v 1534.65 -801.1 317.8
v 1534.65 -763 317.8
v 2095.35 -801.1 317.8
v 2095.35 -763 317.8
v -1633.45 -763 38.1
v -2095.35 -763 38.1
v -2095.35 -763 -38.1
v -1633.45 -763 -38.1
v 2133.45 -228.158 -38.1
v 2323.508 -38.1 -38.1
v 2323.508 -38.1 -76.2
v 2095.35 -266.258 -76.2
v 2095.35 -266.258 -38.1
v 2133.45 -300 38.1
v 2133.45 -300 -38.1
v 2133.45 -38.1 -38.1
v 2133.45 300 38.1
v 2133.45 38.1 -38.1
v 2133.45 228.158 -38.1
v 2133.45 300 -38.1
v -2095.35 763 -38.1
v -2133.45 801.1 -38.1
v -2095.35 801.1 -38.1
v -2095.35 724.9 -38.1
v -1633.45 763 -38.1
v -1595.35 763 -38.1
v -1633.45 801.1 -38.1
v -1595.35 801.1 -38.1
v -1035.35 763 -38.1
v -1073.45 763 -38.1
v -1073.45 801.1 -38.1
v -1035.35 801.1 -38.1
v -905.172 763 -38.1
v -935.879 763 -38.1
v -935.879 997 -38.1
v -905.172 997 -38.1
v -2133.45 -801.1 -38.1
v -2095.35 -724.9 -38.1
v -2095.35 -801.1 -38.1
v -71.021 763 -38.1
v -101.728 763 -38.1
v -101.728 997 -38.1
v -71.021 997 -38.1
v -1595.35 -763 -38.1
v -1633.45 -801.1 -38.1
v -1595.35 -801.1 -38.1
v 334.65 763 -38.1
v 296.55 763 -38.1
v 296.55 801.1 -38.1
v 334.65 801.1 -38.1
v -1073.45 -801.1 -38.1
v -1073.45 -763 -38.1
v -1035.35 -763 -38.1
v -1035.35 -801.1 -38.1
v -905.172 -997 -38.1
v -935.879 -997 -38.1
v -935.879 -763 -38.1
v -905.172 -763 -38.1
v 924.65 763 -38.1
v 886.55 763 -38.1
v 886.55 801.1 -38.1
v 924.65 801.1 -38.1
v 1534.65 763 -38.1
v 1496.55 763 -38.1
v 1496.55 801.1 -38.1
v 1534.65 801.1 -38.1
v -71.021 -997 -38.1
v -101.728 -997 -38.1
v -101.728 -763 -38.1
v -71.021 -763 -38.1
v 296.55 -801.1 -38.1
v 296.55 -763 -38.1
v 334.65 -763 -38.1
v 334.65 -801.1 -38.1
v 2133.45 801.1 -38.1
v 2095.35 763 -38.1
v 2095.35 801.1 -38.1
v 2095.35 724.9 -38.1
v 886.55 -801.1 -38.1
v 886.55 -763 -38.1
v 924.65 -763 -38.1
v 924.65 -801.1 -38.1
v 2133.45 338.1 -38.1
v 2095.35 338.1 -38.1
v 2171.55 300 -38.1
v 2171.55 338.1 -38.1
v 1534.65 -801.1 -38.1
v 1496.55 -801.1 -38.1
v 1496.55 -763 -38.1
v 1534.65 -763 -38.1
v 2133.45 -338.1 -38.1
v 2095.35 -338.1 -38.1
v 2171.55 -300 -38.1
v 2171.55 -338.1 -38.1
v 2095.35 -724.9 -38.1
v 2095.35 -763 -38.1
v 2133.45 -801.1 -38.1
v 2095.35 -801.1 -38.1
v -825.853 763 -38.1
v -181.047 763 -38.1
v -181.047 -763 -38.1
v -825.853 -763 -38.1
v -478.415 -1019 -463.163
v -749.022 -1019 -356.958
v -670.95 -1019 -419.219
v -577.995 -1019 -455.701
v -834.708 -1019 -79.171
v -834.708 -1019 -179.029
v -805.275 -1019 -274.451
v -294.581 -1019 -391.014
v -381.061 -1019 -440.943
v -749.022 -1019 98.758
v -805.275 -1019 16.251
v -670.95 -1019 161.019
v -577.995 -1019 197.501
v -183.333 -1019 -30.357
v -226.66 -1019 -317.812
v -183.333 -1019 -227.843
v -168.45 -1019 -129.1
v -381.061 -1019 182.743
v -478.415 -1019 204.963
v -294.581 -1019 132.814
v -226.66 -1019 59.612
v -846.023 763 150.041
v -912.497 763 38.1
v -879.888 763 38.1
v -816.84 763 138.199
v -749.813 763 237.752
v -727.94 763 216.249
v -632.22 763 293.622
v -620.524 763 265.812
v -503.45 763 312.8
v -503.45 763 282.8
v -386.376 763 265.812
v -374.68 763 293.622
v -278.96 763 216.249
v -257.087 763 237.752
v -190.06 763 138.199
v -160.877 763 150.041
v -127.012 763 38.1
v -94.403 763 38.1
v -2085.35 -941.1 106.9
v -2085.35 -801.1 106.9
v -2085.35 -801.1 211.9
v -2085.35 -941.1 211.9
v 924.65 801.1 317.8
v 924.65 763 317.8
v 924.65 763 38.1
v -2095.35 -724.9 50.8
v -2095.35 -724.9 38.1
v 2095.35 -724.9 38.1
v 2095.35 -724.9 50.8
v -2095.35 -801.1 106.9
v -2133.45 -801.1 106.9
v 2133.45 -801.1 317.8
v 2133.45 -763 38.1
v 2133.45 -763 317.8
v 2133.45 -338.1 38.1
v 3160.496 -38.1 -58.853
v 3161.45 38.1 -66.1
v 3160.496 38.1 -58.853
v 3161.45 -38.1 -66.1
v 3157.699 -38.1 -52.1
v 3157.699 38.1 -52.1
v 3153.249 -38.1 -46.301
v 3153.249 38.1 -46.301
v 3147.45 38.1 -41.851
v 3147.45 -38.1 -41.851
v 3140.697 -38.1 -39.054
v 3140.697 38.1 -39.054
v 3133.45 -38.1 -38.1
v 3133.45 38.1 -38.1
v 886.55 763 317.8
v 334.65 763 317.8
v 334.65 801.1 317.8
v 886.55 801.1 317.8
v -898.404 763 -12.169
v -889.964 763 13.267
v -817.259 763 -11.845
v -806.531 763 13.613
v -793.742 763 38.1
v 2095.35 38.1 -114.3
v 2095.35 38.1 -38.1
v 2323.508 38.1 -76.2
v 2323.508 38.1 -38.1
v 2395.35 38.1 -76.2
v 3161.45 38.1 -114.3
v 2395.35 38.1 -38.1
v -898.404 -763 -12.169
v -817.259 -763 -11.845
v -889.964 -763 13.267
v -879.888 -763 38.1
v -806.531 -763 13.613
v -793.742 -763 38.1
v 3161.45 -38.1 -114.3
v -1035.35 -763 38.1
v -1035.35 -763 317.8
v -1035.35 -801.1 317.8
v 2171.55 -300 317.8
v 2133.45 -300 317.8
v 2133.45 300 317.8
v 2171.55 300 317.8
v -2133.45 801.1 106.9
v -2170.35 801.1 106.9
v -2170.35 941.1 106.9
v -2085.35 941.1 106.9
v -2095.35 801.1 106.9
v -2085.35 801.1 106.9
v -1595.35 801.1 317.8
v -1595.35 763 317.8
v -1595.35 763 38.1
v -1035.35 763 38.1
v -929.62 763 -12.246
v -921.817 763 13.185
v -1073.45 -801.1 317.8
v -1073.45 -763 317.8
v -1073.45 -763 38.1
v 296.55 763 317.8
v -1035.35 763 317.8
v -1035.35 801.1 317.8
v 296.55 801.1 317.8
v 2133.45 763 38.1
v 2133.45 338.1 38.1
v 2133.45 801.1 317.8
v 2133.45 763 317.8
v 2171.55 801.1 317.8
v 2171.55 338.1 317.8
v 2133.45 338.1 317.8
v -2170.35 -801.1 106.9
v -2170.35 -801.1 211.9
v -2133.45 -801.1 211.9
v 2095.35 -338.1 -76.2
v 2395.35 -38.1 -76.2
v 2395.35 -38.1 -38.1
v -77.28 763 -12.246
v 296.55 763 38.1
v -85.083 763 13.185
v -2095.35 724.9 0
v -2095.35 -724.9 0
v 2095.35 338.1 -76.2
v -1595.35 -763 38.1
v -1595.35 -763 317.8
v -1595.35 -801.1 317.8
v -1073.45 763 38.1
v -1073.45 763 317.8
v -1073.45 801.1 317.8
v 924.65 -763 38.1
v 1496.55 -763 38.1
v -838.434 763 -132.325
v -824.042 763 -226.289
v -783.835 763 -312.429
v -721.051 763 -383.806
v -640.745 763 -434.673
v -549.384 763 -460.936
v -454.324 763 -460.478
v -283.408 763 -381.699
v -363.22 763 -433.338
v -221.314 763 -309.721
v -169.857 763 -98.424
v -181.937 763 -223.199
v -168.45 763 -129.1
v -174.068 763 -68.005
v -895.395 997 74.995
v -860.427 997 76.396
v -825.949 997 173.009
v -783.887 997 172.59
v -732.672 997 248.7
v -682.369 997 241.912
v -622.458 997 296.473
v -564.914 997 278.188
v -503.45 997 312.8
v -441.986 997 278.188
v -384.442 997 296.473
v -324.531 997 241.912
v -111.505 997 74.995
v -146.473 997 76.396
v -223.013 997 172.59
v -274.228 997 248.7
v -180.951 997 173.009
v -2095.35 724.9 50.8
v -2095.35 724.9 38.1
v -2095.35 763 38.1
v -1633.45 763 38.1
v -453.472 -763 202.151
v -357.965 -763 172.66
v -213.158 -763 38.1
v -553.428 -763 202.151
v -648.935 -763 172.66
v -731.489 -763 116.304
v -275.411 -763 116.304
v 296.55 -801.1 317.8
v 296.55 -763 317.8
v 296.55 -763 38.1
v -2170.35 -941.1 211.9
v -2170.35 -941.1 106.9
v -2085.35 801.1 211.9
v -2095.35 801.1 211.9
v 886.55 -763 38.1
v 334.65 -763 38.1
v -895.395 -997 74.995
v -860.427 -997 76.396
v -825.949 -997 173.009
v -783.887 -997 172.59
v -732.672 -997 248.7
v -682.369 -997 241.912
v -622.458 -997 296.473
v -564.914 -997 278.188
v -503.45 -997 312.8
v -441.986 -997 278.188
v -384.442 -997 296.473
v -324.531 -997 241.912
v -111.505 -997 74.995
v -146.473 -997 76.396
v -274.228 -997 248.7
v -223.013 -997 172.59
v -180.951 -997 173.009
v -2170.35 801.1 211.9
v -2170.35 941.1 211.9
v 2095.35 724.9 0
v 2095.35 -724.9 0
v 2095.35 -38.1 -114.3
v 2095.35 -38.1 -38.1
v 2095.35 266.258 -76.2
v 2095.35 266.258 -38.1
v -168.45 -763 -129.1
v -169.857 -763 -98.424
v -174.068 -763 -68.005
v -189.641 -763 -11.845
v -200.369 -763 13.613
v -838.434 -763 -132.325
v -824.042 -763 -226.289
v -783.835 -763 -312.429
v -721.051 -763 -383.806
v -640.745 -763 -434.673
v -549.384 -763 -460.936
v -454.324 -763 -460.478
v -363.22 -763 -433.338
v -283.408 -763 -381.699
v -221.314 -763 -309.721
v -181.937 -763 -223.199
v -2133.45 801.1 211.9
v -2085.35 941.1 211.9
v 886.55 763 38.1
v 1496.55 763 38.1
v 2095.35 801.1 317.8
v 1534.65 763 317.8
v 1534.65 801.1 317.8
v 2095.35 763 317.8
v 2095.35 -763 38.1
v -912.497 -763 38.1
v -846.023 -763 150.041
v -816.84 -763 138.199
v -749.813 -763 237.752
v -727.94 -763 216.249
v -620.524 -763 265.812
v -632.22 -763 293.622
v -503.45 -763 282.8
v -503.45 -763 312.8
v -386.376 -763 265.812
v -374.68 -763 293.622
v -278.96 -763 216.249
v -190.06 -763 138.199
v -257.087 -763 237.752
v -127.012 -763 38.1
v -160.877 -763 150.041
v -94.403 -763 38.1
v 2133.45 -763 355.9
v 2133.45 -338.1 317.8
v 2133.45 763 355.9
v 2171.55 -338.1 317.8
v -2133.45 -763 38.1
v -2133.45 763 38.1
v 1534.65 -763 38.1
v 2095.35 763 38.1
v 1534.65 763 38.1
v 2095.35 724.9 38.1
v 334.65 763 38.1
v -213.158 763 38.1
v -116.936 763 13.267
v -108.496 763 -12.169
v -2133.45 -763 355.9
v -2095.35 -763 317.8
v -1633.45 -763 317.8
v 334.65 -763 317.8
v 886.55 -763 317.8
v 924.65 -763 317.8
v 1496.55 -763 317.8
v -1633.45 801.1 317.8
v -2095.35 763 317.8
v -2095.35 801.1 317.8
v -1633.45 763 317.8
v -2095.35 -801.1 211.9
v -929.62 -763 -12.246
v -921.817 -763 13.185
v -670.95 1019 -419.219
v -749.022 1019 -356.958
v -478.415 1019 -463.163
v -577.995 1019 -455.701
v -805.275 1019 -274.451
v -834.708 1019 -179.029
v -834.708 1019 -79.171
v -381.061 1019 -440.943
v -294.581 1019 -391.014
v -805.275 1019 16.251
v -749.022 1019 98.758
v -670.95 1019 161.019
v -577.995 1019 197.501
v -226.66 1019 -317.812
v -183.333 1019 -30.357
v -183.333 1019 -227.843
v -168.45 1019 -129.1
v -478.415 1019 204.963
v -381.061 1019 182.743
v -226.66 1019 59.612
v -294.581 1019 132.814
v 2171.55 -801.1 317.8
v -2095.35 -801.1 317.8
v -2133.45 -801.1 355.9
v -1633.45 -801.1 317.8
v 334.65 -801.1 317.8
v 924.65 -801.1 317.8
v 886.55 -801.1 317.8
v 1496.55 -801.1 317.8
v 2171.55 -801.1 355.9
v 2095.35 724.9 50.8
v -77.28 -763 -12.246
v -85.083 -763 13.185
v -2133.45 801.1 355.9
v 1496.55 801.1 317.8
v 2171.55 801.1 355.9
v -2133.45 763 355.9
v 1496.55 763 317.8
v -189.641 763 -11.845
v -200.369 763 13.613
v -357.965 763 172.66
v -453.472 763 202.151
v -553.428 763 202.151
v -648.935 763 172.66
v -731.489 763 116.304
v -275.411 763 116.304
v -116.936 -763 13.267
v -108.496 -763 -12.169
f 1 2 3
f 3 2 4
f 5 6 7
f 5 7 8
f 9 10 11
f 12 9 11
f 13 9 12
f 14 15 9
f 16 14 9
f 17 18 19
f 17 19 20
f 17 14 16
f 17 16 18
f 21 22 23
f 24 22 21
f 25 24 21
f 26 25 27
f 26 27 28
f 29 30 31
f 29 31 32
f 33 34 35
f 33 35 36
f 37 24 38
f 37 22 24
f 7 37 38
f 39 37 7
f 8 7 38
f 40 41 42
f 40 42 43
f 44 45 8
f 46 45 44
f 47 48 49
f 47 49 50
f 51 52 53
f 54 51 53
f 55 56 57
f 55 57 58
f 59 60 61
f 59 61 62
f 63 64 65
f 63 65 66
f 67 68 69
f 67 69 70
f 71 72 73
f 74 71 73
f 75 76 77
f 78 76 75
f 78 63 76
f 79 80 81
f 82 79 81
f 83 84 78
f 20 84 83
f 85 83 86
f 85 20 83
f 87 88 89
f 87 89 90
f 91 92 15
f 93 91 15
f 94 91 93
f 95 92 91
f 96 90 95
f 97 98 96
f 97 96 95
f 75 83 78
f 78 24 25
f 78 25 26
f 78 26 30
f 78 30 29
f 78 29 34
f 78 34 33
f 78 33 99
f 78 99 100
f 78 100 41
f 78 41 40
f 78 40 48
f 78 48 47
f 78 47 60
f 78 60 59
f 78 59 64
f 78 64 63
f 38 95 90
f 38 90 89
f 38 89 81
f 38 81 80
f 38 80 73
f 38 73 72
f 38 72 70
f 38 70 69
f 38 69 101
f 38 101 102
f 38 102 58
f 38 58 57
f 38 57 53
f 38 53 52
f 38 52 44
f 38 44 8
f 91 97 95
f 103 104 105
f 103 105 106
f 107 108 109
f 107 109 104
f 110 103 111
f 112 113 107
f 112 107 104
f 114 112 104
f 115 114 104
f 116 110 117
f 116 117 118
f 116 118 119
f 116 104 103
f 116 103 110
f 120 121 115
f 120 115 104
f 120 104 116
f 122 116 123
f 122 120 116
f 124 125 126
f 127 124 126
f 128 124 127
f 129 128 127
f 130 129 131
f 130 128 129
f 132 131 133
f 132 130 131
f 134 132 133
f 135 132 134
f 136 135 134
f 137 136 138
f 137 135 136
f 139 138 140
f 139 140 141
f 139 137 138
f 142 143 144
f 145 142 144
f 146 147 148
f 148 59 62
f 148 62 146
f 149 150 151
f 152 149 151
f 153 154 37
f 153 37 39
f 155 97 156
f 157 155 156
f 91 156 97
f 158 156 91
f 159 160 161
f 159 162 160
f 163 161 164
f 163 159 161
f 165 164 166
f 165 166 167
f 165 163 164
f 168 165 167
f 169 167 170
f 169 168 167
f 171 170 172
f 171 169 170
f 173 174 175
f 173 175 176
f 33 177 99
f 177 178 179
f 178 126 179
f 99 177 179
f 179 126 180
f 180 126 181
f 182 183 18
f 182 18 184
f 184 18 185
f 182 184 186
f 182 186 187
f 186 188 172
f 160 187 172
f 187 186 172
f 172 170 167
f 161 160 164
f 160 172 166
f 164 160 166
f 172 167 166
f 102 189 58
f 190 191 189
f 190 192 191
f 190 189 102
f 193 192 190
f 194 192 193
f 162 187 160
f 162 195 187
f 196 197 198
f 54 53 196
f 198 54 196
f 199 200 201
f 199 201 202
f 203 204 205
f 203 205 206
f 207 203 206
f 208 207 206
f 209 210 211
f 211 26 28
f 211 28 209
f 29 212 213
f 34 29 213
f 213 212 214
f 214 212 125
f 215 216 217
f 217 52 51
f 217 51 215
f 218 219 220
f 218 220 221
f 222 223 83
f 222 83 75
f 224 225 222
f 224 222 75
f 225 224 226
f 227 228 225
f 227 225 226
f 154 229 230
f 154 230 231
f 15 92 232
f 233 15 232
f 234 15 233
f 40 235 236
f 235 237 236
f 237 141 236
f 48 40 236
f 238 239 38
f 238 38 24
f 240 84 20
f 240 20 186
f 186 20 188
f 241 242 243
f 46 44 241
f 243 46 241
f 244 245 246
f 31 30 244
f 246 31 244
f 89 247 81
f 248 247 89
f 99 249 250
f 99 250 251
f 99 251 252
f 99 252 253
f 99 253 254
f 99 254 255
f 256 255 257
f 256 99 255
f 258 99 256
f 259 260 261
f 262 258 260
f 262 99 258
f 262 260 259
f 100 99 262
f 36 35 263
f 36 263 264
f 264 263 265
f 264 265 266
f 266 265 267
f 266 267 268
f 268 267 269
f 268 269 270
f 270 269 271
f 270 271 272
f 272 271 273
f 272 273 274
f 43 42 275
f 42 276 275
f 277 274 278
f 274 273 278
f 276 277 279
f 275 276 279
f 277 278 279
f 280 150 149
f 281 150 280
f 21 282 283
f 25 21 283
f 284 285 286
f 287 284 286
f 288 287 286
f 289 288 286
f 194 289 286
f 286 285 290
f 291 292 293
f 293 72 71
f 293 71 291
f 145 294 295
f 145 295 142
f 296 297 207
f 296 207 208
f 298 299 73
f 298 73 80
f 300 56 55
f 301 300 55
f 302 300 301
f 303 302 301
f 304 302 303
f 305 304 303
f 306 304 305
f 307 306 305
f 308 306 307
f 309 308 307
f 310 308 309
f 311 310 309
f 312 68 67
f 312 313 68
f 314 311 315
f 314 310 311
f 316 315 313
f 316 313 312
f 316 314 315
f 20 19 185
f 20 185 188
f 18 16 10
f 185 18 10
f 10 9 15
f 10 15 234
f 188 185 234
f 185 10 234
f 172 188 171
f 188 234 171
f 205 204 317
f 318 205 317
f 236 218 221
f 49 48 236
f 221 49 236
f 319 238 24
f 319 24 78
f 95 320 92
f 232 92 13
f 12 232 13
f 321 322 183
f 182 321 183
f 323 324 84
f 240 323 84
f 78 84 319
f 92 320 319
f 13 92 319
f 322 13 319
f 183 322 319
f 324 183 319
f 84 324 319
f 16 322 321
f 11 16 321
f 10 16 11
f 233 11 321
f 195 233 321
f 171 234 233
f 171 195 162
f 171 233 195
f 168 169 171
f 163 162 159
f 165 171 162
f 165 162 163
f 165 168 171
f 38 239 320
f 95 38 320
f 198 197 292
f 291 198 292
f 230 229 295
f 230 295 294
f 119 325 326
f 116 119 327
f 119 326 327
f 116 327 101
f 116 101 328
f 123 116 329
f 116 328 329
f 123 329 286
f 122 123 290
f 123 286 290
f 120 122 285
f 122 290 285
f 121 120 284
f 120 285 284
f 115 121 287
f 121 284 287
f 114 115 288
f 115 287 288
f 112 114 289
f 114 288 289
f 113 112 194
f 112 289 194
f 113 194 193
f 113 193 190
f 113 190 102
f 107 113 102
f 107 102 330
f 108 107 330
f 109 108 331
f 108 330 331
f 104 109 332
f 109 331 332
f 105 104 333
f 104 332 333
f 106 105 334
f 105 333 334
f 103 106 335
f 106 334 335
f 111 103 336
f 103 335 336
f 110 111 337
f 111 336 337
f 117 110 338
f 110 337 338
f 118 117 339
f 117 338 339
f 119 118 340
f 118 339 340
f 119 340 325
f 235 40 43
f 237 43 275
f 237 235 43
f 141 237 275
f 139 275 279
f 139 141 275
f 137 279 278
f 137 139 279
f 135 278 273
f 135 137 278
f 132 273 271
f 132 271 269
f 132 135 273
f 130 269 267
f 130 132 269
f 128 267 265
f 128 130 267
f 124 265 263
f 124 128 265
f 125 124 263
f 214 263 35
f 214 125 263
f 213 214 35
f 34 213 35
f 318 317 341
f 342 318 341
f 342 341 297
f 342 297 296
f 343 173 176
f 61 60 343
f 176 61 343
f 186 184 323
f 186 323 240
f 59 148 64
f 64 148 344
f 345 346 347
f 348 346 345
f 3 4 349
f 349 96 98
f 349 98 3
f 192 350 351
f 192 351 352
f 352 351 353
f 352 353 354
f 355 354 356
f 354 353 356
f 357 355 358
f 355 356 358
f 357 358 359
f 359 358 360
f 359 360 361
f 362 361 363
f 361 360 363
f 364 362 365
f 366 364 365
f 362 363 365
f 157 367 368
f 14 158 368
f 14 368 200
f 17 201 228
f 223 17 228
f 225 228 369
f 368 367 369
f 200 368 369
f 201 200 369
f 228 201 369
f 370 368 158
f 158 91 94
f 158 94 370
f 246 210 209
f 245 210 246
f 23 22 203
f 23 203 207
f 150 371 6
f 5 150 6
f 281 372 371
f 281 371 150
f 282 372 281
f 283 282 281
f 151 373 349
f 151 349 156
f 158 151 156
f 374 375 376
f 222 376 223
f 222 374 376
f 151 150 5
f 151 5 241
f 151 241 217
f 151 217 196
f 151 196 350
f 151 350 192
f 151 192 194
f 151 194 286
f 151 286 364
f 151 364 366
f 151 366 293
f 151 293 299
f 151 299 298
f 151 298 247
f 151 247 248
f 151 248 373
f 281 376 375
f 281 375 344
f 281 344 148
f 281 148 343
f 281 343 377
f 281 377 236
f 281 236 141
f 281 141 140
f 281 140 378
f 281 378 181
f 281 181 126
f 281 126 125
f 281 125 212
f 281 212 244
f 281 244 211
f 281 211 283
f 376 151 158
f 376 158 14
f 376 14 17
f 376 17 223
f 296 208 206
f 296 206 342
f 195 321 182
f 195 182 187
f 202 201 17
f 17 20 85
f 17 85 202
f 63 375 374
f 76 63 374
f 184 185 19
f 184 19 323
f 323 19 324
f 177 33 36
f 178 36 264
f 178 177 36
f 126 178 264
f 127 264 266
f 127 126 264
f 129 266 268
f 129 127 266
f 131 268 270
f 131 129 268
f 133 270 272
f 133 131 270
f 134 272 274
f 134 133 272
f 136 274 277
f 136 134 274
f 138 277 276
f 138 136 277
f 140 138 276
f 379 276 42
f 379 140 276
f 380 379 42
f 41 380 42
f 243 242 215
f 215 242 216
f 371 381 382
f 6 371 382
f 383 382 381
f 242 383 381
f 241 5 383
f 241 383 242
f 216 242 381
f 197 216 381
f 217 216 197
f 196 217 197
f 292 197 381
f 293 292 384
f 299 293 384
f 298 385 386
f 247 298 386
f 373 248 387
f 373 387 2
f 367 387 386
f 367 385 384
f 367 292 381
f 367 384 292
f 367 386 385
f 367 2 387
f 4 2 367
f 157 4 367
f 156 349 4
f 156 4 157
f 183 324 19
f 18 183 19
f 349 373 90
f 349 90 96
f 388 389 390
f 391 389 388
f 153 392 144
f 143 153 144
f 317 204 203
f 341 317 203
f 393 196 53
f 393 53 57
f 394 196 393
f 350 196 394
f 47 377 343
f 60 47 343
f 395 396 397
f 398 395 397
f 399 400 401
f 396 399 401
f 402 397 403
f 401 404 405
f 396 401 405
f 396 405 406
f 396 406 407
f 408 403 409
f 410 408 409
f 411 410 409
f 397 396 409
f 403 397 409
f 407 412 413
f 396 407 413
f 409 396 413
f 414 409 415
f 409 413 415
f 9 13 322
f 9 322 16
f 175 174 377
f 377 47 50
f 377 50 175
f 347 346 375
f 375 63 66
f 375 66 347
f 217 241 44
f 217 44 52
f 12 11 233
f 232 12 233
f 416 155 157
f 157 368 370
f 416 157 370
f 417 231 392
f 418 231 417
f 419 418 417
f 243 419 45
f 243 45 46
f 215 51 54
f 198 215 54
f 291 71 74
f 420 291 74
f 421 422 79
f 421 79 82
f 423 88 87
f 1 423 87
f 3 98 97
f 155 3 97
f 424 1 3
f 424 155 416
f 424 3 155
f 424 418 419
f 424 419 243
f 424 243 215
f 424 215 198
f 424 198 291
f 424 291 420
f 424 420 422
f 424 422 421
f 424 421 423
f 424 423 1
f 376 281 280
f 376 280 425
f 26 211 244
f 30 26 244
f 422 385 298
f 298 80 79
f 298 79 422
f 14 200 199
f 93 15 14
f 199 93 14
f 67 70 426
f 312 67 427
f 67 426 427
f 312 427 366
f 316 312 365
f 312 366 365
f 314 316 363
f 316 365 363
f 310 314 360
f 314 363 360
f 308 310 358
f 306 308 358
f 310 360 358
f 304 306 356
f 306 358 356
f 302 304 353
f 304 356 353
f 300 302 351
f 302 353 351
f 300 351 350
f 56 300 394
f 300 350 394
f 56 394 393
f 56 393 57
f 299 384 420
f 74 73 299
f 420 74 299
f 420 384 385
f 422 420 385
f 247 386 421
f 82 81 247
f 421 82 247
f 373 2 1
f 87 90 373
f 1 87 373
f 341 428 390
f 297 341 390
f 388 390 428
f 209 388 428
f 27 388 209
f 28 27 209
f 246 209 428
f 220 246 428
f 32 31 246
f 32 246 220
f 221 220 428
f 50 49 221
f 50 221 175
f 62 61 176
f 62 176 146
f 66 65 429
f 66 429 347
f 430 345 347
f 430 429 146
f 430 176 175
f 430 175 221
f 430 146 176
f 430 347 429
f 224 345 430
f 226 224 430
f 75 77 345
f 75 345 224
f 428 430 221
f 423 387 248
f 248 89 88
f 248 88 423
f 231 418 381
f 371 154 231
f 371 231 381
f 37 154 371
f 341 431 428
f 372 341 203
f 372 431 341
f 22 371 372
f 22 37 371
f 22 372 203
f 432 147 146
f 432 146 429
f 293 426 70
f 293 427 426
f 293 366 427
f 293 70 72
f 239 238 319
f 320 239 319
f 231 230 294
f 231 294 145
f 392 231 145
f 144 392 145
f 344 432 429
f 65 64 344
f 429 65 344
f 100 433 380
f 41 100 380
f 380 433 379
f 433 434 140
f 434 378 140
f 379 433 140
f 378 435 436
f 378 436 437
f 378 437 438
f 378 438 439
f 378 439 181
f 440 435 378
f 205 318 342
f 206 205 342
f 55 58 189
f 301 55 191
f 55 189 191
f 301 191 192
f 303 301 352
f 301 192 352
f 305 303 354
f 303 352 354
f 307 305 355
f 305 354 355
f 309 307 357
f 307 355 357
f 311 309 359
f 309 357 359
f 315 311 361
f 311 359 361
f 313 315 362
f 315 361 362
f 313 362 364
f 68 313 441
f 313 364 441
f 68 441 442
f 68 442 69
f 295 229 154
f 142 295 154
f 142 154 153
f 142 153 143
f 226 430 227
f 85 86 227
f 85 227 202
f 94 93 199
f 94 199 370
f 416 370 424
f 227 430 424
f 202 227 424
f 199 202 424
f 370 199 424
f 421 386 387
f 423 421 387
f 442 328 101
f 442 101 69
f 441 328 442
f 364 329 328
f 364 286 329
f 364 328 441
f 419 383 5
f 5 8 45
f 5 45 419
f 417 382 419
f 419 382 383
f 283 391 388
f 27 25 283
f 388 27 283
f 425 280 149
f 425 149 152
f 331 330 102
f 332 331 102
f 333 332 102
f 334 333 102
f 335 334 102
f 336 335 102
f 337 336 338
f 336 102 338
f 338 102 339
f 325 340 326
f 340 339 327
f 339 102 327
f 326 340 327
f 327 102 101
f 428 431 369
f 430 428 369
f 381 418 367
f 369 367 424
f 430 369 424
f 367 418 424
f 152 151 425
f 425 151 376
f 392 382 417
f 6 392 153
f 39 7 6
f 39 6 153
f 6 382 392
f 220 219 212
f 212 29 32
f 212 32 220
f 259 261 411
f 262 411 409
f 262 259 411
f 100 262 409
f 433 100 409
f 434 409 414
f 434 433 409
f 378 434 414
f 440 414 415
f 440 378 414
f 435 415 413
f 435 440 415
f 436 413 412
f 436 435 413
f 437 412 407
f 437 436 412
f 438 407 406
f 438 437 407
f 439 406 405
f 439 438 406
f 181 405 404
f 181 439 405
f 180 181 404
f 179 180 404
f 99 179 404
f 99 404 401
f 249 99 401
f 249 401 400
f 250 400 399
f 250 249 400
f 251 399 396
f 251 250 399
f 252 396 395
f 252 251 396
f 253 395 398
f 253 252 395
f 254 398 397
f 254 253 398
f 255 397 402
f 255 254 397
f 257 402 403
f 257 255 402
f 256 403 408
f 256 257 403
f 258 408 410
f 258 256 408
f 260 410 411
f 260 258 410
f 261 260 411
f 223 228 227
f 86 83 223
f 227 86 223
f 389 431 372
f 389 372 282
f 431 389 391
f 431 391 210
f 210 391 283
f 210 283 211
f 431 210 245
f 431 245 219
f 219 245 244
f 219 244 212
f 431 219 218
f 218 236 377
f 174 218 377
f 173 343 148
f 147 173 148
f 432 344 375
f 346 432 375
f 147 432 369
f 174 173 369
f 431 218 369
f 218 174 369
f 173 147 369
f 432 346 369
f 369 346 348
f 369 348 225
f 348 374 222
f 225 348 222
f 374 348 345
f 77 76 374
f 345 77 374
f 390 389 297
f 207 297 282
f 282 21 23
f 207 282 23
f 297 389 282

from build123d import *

# Parameters (mm, degrees)
F0_W      = 4266.9
F0_H      = 1526
F0_W_2    = 4190.7
F0_H_2    = 1449.8
F1_DEPTH  = 38.1
F2_DEPTH  = 50.8
F4_DEPTH  = 38.1
F6_DEPTH  = 38.1
F7_W      = 38.1
F7_H      = 38.1
F8_DEPTH  = 394
F10_DEPTH = 38.1
F11_W     = 85
F11_H     = 105
F12_DEPTH = 140
F13_R     = 335
F14_DEPTH = 256
F16_DEPTH = 234


# Not quite as in the source:
# - a pattern or mirror of a feature is missing from the dataset's text; its kind, count and spacing are read off the source's solid


with BuildPart() as f1:
    # F0 (on Top) → F1 (new body, symmetric)
    with BuildSketch(Plane.XY):
        Rectangle(F0_W, F0_H)
        Rectangle(F0_W_2, F0_H_2, mode=Mode.SUBTRACT)
    extrude(amount=F1_DEPTH, both=True)

    # F0 (on Top) → F2 (join)
    with BuildSketch(Plane.XY):
        Rectangle(F0_W_2, F0_H_2)
    extrude(amount=F2_DEPTH)

    # F3 (on Front) → F4 (join, symmetric)
    with BuildSketch(Plane.XZ):
        with BuildLine():
            Line((3133.45, -38.1), (2095.35, -38.1))
            Line((2095.35, -38.1), (2095.35, -114.3))
            Line((2095.35, -114.3), (3161.45, -114.3))
            Line((3161.45, -114.3), (3161.45, -66.1))
            ThreePointArc((3161.45, -66.1), (3153.2489898732, -46.3010101268), (3133.45, -38.1))
        make_face()
    extrude(amount=F4_DEPTH, both=True)

    # F5 (on face) → F6 (join)
    with BuildSketch(Plane.XY.offset(-38.1)):
        Polygon((2395.35, -38.1), (2323.5079510314, -38.1), (2095.35, -266.2579510314), (2095.35, -338.1), align=None)
    f6 = extrude(amount=-F6_DEPTH)

    # F6_copies: F6 across plane
    add(f6.mirror(Plane.ZX))

    # F7 (on face) → F8 (join)
    with BuildSketch(Plane(origin=(0, 0, -38.1), x_dir=(1, 0, 0), z_dir=(0, 0, -1))):
        with Locations((-2114.4, 782.05)):
            Rectangle(F7_W, F7_H)
        with Locations((-1614.4, 782.05)):
            Rectangle(F7_W, F7_H)
        with Locations((-1054.4, 782.05)):
            Rectangle(F7_W, F7_H)
        with Locations((315.6, 782.05)):
            Rectangle(F7_W, F7_H)
        with Locations((905.6, 782.05)):
            Rectangle(F7_W, F7_H)
        with Locations((1515.6, 782.05)):
            Rectangle(F7_W, F7_H)
        with Locations((2114.4, 782.05)):
            Rectangle(F7_W, F7_H)
        with Locations((2152.5, 319.05)):
            Rectangle(F7_W, F7_H)
    f8 = extrude(amount=-F8_DEPTH)

    # F8_copies: F8 across plane
    add(f8.mirror(Plane.ZX))

    # F9 (on face) → F10 (join)
    with BuildSketch(Plane.XY.offset(355.9)):
        Polygon((2133.45, 0), (2133.45, -763), (-2133.45, -763), (-2133.45, -801.1), (2171.55, -801.1), (2171.55, 0), align=None)
    f10 = extrude(amount=-F10_DEPTH)

    # F10_copies: F10 across plane
    add(f10.mirror(Plane.ZX))

    # F11 (on face) → F12 (join)
    with BuildSketch(Plane.XZ.offset(801.1)):
        with Locations((-2127.85, 159.4)):
            Rectangle(F11_W, F11_H)
    f12 = extrude(amount=F12_DEPTH)

    # F12_copies: F12 across plane
    add(f12.mirror(Plane.ZX))

    # F13 (on face) → F14 (join)
    with BuildSketch(Plane.XZ.offset(763)):
        with Locations((-503.45, -129.1)):
            Circle(F13_R)
    f14 = extrude(amount=F14_DEPTH)

    # F14_copies: F14 across plane
    add(f14.mirror(Plane.ZX))

    # F15 (on face) → F16 (join)
    with BuildSketch(Plane.XZ.offset(763)):
        with BuildLine():
            Line((-101.7279443446, -38.1), (-71.0212659871, -38.1))
            ThreePointArc((-71.0212659871, -38.1), (-503.45, 312.8), (-935.8787340129, -38.1))
            Line((-935.8787340129, -38.1), (-905.1720556554, -38.1))
            ThreePointArc((-905.1720556554, -38.1), (-503.45, 282.8), (-101.7279443446, -38.1))
        make_face()
    f16 = extrude(amount=F16_DEPTH)

    # F16_copies: F16 across plane
    add(f16.mirror(Plane.ZX))


solid = f1.part
